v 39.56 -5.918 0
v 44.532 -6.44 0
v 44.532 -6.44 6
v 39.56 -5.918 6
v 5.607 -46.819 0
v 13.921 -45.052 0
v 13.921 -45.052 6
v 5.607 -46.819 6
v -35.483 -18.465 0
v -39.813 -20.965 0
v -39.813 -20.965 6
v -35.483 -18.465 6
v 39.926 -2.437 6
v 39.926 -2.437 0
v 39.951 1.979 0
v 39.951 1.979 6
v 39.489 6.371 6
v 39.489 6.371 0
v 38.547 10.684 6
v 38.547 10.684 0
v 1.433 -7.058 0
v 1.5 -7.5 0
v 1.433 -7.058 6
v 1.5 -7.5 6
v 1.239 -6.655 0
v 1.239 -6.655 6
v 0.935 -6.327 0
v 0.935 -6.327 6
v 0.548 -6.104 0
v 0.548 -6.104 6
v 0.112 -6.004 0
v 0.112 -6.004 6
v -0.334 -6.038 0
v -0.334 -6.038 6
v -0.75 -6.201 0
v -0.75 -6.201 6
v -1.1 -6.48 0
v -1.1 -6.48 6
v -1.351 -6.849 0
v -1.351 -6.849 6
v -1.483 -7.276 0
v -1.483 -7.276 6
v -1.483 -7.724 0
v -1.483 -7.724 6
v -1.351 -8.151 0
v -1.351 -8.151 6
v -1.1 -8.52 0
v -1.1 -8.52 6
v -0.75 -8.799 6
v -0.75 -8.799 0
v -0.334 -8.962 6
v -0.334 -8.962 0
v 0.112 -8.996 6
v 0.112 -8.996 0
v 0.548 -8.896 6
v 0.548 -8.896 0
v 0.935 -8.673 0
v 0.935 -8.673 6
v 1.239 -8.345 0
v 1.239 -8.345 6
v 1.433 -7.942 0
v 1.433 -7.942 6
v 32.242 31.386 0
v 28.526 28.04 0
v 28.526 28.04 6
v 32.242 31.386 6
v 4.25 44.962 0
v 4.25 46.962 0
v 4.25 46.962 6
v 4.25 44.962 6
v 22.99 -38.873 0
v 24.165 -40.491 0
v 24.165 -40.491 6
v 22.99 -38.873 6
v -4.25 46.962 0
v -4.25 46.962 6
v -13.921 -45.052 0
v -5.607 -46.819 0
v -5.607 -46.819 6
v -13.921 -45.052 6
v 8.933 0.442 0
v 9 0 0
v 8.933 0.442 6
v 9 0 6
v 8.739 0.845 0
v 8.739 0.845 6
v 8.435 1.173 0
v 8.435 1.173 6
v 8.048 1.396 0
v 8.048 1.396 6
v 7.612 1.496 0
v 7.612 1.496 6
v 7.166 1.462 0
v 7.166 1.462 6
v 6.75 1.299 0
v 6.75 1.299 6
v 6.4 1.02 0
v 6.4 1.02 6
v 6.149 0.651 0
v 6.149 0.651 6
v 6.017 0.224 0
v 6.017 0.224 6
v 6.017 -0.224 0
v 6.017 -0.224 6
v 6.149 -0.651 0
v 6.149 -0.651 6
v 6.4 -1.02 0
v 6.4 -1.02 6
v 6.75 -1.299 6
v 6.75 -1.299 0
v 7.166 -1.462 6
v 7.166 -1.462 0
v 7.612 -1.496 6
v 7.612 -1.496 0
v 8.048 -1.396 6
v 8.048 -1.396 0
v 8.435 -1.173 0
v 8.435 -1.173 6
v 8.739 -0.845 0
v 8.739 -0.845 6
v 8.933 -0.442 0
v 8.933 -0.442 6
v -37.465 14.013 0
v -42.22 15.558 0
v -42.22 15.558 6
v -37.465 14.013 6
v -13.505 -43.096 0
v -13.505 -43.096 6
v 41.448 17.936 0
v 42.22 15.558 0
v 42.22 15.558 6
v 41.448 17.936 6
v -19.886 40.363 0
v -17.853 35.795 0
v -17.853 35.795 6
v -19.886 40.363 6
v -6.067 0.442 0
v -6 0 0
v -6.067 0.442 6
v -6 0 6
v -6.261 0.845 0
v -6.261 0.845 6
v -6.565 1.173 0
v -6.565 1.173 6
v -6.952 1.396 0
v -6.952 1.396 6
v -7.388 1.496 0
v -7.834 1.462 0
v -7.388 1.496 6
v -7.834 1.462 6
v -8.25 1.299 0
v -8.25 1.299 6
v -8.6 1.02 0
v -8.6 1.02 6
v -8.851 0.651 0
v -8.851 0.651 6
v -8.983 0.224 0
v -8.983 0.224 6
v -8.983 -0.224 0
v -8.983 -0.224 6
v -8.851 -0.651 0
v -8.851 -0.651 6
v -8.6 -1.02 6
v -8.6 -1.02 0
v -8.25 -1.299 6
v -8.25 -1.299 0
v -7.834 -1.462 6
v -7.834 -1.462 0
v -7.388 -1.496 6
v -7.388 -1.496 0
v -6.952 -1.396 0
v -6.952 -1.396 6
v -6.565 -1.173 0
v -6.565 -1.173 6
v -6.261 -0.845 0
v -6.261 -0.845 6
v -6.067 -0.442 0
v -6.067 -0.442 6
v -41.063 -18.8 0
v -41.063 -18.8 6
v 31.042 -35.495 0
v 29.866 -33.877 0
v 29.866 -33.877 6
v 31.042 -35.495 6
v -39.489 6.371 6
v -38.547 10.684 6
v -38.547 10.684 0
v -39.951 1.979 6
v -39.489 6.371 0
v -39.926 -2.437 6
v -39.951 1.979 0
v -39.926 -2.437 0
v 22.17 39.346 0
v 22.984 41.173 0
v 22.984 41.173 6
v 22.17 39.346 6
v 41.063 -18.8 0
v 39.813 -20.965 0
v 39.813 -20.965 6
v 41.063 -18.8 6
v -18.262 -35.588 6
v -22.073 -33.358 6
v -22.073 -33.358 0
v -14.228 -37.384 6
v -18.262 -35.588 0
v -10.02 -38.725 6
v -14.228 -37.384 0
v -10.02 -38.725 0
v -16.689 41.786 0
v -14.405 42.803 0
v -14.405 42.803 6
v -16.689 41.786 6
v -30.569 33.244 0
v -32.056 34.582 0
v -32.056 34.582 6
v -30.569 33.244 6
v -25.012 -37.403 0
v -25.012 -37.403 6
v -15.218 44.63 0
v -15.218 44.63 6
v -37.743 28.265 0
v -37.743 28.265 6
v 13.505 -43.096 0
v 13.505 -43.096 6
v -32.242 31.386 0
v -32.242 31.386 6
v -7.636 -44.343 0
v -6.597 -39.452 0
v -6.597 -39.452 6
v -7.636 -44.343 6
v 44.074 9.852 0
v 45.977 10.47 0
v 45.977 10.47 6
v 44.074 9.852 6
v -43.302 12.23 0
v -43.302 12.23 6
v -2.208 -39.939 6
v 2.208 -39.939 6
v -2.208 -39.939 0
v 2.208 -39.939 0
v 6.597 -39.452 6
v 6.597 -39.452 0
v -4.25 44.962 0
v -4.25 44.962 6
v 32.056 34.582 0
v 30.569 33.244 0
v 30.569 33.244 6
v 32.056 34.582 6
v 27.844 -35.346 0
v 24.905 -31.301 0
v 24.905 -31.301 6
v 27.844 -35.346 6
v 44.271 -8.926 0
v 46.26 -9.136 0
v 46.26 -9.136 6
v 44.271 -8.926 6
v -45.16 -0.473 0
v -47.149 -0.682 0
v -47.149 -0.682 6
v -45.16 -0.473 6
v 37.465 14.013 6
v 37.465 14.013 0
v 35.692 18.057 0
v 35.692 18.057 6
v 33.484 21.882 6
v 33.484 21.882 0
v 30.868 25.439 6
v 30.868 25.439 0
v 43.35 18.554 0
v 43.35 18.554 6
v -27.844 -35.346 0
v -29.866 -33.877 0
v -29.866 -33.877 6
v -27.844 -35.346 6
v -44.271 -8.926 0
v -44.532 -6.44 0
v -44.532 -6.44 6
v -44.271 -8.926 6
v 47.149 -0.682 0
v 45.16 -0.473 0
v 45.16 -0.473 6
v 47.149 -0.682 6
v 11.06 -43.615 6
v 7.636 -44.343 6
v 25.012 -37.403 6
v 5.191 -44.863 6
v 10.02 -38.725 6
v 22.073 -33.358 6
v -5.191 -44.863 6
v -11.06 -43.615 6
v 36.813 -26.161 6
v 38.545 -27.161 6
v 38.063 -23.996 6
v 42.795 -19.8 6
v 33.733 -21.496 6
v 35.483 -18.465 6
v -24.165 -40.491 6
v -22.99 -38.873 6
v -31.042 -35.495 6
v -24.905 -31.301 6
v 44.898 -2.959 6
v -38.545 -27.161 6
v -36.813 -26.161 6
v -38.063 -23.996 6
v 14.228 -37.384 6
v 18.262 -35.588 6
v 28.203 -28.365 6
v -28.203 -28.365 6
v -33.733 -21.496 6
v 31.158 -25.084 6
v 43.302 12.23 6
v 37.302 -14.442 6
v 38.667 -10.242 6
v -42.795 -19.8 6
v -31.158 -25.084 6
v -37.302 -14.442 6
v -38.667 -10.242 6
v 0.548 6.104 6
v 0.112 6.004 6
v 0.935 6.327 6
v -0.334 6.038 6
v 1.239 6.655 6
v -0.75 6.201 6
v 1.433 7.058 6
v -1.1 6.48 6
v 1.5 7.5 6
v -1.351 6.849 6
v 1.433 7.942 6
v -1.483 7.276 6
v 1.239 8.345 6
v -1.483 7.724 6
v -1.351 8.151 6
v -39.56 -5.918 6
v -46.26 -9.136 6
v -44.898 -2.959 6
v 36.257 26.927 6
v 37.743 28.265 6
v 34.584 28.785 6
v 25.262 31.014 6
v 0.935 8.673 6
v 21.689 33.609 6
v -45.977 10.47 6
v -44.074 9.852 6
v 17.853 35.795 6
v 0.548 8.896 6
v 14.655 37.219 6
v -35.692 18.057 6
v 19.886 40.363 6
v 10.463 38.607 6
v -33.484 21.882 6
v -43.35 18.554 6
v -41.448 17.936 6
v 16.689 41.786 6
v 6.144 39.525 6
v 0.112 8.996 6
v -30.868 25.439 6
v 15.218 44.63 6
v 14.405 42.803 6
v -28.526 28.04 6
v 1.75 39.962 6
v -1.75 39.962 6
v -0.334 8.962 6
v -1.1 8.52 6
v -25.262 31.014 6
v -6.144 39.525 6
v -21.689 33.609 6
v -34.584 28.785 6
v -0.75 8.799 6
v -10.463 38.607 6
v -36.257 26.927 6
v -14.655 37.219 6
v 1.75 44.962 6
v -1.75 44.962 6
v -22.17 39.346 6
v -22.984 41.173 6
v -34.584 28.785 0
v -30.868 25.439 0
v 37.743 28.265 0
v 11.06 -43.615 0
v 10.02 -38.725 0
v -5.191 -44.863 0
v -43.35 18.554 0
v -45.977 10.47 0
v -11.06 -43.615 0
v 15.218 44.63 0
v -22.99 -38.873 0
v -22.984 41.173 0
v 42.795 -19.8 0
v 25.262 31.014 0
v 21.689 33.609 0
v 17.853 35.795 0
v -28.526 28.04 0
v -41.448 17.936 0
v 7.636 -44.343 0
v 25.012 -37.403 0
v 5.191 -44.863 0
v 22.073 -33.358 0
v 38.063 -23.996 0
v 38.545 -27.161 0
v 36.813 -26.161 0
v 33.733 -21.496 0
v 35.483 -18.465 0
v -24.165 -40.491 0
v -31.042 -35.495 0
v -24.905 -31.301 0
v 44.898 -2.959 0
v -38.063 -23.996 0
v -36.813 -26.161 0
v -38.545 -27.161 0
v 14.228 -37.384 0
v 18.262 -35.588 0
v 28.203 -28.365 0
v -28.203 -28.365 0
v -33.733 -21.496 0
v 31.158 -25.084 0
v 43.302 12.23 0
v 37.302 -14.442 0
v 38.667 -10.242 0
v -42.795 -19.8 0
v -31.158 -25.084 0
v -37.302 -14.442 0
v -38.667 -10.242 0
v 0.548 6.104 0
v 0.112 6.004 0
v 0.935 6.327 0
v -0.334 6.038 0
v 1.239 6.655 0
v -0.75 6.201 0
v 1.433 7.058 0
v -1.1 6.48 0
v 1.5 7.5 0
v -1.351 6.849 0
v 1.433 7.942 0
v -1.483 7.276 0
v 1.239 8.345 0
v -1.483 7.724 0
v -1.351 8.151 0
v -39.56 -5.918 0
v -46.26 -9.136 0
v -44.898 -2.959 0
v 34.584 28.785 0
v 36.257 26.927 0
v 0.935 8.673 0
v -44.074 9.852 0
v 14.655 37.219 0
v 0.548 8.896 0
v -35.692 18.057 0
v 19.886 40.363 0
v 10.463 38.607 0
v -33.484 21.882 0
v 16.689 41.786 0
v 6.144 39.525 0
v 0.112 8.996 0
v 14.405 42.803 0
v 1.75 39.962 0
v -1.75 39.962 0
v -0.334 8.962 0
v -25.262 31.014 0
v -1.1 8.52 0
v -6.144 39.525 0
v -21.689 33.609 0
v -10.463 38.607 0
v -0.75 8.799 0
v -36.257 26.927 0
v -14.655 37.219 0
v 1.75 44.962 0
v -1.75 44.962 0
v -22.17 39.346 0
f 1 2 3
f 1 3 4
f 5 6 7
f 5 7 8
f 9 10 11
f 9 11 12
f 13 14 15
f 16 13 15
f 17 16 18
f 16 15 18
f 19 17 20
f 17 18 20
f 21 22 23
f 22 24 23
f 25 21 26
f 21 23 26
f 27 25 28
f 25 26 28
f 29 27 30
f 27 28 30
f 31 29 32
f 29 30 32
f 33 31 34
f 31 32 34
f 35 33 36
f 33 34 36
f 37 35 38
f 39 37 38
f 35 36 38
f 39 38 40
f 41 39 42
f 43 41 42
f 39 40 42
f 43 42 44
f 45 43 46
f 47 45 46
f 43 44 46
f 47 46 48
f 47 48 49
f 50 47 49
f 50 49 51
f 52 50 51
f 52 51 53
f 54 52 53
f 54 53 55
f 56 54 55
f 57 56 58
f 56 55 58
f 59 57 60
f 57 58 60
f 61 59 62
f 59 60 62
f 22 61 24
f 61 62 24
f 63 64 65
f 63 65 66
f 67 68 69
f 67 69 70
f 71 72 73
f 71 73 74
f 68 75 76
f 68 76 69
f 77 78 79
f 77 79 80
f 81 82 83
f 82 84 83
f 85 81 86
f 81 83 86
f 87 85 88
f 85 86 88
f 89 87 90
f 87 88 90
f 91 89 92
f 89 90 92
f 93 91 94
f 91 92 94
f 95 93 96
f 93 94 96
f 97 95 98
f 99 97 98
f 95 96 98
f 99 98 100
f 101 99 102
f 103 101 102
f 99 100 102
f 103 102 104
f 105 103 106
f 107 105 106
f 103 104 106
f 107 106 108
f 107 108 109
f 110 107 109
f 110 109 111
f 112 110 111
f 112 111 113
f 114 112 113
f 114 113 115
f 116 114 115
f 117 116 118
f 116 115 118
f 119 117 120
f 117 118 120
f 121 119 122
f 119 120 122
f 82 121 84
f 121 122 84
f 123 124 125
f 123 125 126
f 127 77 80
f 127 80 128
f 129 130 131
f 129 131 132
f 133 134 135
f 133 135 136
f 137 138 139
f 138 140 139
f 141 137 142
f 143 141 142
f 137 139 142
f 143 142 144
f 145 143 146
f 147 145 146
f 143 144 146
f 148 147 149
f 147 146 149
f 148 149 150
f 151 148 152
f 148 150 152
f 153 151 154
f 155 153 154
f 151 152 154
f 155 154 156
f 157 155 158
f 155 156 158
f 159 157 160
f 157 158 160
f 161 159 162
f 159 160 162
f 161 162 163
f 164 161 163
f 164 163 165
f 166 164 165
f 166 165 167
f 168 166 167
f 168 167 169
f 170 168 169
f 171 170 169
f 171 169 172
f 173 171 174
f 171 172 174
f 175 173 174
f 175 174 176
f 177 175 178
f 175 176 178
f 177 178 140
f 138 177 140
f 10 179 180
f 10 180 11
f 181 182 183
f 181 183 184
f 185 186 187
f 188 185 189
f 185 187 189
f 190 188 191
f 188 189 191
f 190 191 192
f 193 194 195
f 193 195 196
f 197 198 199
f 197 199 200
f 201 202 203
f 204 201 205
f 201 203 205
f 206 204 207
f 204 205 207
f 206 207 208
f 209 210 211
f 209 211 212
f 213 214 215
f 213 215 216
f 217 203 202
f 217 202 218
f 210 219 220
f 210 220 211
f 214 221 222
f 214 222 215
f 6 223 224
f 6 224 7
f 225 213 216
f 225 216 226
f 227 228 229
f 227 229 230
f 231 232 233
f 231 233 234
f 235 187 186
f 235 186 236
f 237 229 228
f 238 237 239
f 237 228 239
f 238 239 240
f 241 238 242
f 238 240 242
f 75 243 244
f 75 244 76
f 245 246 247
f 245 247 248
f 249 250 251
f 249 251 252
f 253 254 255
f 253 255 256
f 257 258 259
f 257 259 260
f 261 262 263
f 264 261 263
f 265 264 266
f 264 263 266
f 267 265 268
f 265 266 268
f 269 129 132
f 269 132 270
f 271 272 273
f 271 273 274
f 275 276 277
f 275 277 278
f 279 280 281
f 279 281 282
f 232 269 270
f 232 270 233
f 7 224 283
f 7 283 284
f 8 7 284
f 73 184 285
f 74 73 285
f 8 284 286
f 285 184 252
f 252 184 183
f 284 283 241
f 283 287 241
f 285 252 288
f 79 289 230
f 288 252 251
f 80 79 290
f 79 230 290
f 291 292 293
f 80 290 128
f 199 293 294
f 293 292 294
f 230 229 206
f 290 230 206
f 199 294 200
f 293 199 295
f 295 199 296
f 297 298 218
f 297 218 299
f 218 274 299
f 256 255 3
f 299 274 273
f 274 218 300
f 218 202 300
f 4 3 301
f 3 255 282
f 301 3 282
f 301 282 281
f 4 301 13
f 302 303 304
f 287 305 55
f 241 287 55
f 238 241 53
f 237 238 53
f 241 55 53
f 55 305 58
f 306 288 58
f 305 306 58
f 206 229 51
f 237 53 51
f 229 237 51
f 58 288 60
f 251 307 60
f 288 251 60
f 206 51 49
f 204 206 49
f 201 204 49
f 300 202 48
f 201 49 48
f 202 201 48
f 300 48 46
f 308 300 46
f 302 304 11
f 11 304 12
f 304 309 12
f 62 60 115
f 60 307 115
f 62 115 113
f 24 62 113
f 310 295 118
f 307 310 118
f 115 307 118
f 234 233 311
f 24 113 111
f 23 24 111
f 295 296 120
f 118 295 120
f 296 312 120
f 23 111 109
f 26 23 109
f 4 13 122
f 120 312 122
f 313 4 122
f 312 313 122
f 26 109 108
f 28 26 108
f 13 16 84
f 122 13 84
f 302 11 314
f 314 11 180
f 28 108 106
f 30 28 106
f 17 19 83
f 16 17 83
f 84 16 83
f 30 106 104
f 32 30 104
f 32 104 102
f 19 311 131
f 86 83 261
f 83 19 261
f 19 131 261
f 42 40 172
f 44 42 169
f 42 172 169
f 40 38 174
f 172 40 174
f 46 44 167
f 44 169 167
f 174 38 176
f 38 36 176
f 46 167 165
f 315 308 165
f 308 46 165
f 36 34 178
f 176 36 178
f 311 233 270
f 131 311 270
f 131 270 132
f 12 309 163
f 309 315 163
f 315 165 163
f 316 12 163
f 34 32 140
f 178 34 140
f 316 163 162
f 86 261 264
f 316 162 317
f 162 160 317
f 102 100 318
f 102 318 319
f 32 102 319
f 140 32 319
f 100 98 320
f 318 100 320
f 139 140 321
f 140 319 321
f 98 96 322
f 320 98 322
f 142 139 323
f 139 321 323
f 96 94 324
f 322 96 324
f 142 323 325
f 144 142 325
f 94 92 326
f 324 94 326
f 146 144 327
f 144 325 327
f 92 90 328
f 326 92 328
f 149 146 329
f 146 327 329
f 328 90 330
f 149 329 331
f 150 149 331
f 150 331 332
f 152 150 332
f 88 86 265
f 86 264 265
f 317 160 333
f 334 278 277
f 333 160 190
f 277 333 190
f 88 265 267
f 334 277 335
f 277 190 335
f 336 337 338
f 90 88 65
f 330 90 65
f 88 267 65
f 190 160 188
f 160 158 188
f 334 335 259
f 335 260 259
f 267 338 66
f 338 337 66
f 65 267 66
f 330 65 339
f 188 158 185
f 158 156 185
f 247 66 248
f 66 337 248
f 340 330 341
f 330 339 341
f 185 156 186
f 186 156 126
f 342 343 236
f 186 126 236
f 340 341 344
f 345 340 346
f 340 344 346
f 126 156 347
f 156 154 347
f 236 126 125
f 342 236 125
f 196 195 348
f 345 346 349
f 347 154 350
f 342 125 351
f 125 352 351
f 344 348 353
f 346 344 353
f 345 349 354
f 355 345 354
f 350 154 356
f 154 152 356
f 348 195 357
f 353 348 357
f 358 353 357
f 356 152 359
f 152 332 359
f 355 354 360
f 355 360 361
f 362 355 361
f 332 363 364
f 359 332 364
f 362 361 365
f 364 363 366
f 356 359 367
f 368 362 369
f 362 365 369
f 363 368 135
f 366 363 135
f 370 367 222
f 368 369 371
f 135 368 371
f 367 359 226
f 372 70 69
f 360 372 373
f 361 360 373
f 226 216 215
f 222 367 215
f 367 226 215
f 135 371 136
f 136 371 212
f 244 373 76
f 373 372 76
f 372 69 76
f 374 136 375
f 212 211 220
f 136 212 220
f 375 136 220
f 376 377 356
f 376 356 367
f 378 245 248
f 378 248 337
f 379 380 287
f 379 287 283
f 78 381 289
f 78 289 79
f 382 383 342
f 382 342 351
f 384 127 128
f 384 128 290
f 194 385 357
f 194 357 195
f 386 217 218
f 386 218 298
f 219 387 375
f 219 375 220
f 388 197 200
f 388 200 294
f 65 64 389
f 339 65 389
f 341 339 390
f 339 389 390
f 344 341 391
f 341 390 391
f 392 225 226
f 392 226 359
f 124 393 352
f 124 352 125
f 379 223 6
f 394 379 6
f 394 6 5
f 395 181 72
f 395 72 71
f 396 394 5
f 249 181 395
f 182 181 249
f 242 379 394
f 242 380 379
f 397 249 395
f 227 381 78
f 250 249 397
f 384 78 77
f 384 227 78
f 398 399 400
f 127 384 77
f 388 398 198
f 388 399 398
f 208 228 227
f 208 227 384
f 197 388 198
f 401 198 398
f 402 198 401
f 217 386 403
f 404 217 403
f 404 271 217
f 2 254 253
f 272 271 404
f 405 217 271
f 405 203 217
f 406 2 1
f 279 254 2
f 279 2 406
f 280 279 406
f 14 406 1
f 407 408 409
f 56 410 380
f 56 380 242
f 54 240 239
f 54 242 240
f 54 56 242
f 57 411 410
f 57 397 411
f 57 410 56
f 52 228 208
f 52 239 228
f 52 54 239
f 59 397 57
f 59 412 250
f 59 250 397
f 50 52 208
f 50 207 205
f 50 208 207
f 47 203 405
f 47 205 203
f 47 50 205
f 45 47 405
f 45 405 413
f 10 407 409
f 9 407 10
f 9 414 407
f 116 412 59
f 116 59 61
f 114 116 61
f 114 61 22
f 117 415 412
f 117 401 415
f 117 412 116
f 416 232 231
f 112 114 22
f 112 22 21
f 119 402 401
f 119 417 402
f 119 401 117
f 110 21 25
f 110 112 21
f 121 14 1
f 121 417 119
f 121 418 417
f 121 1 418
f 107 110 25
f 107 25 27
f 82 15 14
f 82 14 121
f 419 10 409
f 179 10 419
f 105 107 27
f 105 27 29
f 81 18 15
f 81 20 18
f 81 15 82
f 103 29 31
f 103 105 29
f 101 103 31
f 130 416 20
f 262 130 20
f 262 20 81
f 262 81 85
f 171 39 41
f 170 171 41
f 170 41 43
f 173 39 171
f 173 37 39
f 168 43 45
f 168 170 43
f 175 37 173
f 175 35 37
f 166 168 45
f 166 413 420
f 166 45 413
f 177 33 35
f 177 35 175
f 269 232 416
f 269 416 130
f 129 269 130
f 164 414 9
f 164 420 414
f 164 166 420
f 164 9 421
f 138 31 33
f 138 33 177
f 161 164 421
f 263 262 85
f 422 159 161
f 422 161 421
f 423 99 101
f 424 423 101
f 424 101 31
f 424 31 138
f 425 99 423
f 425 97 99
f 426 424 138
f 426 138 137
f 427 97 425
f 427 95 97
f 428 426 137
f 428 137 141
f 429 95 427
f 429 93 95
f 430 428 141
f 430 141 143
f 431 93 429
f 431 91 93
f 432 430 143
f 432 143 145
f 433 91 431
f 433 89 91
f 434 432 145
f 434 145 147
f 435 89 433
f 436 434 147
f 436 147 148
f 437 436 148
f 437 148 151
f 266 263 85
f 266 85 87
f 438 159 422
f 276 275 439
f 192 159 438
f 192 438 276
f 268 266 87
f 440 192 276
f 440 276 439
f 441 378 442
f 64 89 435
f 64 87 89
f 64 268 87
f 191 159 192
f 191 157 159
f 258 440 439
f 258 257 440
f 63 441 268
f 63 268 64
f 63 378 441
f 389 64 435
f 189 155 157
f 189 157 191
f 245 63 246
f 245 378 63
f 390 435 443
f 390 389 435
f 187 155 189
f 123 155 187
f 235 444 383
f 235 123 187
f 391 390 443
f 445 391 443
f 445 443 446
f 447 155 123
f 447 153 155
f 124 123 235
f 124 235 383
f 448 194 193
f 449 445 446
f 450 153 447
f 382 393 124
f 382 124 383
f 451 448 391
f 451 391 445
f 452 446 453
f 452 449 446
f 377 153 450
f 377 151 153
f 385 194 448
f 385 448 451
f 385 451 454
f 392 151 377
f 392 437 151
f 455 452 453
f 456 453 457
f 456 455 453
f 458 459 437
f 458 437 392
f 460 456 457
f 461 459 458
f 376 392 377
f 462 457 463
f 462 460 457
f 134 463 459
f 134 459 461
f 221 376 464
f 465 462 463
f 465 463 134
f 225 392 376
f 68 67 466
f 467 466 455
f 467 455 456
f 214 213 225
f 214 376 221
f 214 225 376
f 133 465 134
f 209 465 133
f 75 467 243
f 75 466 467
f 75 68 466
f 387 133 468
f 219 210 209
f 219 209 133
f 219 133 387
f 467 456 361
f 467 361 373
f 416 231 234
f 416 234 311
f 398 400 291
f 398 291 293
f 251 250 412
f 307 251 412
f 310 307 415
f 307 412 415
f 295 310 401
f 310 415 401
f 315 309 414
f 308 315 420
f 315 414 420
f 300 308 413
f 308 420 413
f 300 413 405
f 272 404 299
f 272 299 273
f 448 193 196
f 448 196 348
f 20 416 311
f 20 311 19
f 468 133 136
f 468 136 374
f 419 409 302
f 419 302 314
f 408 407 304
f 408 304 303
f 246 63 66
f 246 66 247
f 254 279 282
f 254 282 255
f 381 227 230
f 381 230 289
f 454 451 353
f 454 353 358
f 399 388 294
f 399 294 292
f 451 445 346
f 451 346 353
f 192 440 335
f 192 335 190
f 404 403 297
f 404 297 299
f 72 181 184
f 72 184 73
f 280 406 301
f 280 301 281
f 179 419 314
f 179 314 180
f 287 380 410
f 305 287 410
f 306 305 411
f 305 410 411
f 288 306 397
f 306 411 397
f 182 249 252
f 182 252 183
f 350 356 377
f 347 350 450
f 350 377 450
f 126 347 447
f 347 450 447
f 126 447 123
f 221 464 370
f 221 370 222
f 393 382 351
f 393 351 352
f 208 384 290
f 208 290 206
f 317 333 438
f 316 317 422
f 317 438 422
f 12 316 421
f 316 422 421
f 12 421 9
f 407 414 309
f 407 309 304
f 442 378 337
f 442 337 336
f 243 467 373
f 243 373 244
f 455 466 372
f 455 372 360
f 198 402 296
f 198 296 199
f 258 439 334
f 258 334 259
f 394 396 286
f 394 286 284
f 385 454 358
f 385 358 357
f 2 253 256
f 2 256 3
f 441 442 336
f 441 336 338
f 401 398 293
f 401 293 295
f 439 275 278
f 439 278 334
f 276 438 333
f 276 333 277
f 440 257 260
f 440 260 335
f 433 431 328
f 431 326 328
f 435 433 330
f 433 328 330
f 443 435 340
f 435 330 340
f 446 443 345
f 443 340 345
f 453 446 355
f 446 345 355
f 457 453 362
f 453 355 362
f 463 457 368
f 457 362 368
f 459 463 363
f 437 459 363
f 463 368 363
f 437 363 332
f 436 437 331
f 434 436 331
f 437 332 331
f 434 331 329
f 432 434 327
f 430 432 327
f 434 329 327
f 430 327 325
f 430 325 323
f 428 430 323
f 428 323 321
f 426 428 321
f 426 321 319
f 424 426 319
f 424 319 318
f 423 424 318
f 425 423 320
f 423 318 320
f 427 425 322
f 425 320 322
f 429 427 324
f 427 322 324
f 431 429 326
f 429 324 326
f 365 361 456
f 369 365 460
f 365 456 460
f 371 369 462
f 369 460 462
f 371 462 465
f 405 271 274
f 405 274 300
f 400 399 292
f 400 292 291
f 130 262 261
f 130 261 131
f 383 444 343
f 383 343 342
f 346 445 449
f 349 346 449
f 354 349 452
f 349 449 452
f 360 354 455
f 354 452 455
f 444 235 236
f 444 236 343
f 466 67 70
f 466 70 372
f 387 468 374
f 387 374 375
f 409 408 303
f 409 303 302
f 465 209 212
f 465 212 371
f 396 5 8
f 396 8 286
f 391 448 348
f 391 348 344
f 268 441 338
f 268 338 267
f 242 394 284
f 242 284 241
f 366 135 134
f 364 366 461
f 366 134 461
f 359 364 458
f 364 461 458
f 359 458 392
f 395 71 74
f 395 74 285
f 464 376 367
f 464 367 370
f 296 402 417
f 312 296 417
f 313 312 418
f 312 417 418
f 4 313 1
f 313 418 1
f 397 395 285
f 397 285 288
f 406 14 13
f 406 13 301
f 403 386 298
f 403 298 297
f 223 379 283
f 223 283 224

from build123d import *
from build123d.topology import SkipClean

# Parameters (mm, degrees)
SKETCH1_R           = 40
BOSS_EXTRUDE1_DEPTH = 2
BOSS_EXTRUDE2_DEPTH = 6
CIRPATTERN1_COUNT   = 15
SKETCH4_R           = 1.5
CUT_EXTRUDE2_DEPTH  = 10


with BuildPart() as part:
    # Sketch1 → Boss-Extrude1 (new body)
    with BuildSketch(Plane.XY):
        Circle(SKETCH1_R)
    extrude(amount=BOSS_EXTRUDE1_DEPTH)

    # Sketch6 → Boss-Extrude2 (add)
    with SkipClean():  # the faces are left unmerged after this step: merging them gives an invalid solid
        with BuildSketch(Plane.XY):
            with BuildLine():
                Line((-1.75, 39.961700414), (-1.75, 44.961700414))
                Line((-1.75, 44.961700414), (-4.25, 44.961700414))
                Line((-4.25, 44.961700414), (-4.25, 46.961700414))
                Line((-4.25, 46.961700414), (4.25, 46.961700414))
                Line((4.25, 46.961700414), (4.25, 44.961700414))
                Line((4.25, 44.961700414), (1.75, 44.961700414))
                Line((1.75, 44.961700414), (1.75, 39.961700414))
                ThreePointArc((1.75, 39.961700414), (0, -40), (-1.75, 39.961700414))
            make_face()
        boss_extrude2 = extrude(amount=BOSS_EXTRUDE2_DEPTH)

    # CirPattern1: Boss-Extrude2 ×15 about axis
    cirpattern1_axis = Axis((0, 0, 0), (0, 0, 1))
    for i in range(1, CIRPATTERN1_COUNT):
        add(boss_extrude2.rotate(cirpattern1_axis, i * 360 / CIRPATTERN1_COUNT))

    # Sketch4 → Cut-Extrude2 (cut, symmetric)
    with BuildSketch(Plane.XY.offset(2)):
        with Locations((0, 7.5)):
            Circle(SKETCH4_R)
        with Locations((7.5, 0)):
            Circle(SKETCH4_R)
        with Locations((0, -7.5)):
            Circle(SKETCH4_R)
        with Locations((-7.5, 0)):
            Circle(SKETCH4_R)
    extrude(amount=CUT_EXTRUDE2_DEPTH, both=True, mode=Mode.SUBTRACT)


solid = part.part
